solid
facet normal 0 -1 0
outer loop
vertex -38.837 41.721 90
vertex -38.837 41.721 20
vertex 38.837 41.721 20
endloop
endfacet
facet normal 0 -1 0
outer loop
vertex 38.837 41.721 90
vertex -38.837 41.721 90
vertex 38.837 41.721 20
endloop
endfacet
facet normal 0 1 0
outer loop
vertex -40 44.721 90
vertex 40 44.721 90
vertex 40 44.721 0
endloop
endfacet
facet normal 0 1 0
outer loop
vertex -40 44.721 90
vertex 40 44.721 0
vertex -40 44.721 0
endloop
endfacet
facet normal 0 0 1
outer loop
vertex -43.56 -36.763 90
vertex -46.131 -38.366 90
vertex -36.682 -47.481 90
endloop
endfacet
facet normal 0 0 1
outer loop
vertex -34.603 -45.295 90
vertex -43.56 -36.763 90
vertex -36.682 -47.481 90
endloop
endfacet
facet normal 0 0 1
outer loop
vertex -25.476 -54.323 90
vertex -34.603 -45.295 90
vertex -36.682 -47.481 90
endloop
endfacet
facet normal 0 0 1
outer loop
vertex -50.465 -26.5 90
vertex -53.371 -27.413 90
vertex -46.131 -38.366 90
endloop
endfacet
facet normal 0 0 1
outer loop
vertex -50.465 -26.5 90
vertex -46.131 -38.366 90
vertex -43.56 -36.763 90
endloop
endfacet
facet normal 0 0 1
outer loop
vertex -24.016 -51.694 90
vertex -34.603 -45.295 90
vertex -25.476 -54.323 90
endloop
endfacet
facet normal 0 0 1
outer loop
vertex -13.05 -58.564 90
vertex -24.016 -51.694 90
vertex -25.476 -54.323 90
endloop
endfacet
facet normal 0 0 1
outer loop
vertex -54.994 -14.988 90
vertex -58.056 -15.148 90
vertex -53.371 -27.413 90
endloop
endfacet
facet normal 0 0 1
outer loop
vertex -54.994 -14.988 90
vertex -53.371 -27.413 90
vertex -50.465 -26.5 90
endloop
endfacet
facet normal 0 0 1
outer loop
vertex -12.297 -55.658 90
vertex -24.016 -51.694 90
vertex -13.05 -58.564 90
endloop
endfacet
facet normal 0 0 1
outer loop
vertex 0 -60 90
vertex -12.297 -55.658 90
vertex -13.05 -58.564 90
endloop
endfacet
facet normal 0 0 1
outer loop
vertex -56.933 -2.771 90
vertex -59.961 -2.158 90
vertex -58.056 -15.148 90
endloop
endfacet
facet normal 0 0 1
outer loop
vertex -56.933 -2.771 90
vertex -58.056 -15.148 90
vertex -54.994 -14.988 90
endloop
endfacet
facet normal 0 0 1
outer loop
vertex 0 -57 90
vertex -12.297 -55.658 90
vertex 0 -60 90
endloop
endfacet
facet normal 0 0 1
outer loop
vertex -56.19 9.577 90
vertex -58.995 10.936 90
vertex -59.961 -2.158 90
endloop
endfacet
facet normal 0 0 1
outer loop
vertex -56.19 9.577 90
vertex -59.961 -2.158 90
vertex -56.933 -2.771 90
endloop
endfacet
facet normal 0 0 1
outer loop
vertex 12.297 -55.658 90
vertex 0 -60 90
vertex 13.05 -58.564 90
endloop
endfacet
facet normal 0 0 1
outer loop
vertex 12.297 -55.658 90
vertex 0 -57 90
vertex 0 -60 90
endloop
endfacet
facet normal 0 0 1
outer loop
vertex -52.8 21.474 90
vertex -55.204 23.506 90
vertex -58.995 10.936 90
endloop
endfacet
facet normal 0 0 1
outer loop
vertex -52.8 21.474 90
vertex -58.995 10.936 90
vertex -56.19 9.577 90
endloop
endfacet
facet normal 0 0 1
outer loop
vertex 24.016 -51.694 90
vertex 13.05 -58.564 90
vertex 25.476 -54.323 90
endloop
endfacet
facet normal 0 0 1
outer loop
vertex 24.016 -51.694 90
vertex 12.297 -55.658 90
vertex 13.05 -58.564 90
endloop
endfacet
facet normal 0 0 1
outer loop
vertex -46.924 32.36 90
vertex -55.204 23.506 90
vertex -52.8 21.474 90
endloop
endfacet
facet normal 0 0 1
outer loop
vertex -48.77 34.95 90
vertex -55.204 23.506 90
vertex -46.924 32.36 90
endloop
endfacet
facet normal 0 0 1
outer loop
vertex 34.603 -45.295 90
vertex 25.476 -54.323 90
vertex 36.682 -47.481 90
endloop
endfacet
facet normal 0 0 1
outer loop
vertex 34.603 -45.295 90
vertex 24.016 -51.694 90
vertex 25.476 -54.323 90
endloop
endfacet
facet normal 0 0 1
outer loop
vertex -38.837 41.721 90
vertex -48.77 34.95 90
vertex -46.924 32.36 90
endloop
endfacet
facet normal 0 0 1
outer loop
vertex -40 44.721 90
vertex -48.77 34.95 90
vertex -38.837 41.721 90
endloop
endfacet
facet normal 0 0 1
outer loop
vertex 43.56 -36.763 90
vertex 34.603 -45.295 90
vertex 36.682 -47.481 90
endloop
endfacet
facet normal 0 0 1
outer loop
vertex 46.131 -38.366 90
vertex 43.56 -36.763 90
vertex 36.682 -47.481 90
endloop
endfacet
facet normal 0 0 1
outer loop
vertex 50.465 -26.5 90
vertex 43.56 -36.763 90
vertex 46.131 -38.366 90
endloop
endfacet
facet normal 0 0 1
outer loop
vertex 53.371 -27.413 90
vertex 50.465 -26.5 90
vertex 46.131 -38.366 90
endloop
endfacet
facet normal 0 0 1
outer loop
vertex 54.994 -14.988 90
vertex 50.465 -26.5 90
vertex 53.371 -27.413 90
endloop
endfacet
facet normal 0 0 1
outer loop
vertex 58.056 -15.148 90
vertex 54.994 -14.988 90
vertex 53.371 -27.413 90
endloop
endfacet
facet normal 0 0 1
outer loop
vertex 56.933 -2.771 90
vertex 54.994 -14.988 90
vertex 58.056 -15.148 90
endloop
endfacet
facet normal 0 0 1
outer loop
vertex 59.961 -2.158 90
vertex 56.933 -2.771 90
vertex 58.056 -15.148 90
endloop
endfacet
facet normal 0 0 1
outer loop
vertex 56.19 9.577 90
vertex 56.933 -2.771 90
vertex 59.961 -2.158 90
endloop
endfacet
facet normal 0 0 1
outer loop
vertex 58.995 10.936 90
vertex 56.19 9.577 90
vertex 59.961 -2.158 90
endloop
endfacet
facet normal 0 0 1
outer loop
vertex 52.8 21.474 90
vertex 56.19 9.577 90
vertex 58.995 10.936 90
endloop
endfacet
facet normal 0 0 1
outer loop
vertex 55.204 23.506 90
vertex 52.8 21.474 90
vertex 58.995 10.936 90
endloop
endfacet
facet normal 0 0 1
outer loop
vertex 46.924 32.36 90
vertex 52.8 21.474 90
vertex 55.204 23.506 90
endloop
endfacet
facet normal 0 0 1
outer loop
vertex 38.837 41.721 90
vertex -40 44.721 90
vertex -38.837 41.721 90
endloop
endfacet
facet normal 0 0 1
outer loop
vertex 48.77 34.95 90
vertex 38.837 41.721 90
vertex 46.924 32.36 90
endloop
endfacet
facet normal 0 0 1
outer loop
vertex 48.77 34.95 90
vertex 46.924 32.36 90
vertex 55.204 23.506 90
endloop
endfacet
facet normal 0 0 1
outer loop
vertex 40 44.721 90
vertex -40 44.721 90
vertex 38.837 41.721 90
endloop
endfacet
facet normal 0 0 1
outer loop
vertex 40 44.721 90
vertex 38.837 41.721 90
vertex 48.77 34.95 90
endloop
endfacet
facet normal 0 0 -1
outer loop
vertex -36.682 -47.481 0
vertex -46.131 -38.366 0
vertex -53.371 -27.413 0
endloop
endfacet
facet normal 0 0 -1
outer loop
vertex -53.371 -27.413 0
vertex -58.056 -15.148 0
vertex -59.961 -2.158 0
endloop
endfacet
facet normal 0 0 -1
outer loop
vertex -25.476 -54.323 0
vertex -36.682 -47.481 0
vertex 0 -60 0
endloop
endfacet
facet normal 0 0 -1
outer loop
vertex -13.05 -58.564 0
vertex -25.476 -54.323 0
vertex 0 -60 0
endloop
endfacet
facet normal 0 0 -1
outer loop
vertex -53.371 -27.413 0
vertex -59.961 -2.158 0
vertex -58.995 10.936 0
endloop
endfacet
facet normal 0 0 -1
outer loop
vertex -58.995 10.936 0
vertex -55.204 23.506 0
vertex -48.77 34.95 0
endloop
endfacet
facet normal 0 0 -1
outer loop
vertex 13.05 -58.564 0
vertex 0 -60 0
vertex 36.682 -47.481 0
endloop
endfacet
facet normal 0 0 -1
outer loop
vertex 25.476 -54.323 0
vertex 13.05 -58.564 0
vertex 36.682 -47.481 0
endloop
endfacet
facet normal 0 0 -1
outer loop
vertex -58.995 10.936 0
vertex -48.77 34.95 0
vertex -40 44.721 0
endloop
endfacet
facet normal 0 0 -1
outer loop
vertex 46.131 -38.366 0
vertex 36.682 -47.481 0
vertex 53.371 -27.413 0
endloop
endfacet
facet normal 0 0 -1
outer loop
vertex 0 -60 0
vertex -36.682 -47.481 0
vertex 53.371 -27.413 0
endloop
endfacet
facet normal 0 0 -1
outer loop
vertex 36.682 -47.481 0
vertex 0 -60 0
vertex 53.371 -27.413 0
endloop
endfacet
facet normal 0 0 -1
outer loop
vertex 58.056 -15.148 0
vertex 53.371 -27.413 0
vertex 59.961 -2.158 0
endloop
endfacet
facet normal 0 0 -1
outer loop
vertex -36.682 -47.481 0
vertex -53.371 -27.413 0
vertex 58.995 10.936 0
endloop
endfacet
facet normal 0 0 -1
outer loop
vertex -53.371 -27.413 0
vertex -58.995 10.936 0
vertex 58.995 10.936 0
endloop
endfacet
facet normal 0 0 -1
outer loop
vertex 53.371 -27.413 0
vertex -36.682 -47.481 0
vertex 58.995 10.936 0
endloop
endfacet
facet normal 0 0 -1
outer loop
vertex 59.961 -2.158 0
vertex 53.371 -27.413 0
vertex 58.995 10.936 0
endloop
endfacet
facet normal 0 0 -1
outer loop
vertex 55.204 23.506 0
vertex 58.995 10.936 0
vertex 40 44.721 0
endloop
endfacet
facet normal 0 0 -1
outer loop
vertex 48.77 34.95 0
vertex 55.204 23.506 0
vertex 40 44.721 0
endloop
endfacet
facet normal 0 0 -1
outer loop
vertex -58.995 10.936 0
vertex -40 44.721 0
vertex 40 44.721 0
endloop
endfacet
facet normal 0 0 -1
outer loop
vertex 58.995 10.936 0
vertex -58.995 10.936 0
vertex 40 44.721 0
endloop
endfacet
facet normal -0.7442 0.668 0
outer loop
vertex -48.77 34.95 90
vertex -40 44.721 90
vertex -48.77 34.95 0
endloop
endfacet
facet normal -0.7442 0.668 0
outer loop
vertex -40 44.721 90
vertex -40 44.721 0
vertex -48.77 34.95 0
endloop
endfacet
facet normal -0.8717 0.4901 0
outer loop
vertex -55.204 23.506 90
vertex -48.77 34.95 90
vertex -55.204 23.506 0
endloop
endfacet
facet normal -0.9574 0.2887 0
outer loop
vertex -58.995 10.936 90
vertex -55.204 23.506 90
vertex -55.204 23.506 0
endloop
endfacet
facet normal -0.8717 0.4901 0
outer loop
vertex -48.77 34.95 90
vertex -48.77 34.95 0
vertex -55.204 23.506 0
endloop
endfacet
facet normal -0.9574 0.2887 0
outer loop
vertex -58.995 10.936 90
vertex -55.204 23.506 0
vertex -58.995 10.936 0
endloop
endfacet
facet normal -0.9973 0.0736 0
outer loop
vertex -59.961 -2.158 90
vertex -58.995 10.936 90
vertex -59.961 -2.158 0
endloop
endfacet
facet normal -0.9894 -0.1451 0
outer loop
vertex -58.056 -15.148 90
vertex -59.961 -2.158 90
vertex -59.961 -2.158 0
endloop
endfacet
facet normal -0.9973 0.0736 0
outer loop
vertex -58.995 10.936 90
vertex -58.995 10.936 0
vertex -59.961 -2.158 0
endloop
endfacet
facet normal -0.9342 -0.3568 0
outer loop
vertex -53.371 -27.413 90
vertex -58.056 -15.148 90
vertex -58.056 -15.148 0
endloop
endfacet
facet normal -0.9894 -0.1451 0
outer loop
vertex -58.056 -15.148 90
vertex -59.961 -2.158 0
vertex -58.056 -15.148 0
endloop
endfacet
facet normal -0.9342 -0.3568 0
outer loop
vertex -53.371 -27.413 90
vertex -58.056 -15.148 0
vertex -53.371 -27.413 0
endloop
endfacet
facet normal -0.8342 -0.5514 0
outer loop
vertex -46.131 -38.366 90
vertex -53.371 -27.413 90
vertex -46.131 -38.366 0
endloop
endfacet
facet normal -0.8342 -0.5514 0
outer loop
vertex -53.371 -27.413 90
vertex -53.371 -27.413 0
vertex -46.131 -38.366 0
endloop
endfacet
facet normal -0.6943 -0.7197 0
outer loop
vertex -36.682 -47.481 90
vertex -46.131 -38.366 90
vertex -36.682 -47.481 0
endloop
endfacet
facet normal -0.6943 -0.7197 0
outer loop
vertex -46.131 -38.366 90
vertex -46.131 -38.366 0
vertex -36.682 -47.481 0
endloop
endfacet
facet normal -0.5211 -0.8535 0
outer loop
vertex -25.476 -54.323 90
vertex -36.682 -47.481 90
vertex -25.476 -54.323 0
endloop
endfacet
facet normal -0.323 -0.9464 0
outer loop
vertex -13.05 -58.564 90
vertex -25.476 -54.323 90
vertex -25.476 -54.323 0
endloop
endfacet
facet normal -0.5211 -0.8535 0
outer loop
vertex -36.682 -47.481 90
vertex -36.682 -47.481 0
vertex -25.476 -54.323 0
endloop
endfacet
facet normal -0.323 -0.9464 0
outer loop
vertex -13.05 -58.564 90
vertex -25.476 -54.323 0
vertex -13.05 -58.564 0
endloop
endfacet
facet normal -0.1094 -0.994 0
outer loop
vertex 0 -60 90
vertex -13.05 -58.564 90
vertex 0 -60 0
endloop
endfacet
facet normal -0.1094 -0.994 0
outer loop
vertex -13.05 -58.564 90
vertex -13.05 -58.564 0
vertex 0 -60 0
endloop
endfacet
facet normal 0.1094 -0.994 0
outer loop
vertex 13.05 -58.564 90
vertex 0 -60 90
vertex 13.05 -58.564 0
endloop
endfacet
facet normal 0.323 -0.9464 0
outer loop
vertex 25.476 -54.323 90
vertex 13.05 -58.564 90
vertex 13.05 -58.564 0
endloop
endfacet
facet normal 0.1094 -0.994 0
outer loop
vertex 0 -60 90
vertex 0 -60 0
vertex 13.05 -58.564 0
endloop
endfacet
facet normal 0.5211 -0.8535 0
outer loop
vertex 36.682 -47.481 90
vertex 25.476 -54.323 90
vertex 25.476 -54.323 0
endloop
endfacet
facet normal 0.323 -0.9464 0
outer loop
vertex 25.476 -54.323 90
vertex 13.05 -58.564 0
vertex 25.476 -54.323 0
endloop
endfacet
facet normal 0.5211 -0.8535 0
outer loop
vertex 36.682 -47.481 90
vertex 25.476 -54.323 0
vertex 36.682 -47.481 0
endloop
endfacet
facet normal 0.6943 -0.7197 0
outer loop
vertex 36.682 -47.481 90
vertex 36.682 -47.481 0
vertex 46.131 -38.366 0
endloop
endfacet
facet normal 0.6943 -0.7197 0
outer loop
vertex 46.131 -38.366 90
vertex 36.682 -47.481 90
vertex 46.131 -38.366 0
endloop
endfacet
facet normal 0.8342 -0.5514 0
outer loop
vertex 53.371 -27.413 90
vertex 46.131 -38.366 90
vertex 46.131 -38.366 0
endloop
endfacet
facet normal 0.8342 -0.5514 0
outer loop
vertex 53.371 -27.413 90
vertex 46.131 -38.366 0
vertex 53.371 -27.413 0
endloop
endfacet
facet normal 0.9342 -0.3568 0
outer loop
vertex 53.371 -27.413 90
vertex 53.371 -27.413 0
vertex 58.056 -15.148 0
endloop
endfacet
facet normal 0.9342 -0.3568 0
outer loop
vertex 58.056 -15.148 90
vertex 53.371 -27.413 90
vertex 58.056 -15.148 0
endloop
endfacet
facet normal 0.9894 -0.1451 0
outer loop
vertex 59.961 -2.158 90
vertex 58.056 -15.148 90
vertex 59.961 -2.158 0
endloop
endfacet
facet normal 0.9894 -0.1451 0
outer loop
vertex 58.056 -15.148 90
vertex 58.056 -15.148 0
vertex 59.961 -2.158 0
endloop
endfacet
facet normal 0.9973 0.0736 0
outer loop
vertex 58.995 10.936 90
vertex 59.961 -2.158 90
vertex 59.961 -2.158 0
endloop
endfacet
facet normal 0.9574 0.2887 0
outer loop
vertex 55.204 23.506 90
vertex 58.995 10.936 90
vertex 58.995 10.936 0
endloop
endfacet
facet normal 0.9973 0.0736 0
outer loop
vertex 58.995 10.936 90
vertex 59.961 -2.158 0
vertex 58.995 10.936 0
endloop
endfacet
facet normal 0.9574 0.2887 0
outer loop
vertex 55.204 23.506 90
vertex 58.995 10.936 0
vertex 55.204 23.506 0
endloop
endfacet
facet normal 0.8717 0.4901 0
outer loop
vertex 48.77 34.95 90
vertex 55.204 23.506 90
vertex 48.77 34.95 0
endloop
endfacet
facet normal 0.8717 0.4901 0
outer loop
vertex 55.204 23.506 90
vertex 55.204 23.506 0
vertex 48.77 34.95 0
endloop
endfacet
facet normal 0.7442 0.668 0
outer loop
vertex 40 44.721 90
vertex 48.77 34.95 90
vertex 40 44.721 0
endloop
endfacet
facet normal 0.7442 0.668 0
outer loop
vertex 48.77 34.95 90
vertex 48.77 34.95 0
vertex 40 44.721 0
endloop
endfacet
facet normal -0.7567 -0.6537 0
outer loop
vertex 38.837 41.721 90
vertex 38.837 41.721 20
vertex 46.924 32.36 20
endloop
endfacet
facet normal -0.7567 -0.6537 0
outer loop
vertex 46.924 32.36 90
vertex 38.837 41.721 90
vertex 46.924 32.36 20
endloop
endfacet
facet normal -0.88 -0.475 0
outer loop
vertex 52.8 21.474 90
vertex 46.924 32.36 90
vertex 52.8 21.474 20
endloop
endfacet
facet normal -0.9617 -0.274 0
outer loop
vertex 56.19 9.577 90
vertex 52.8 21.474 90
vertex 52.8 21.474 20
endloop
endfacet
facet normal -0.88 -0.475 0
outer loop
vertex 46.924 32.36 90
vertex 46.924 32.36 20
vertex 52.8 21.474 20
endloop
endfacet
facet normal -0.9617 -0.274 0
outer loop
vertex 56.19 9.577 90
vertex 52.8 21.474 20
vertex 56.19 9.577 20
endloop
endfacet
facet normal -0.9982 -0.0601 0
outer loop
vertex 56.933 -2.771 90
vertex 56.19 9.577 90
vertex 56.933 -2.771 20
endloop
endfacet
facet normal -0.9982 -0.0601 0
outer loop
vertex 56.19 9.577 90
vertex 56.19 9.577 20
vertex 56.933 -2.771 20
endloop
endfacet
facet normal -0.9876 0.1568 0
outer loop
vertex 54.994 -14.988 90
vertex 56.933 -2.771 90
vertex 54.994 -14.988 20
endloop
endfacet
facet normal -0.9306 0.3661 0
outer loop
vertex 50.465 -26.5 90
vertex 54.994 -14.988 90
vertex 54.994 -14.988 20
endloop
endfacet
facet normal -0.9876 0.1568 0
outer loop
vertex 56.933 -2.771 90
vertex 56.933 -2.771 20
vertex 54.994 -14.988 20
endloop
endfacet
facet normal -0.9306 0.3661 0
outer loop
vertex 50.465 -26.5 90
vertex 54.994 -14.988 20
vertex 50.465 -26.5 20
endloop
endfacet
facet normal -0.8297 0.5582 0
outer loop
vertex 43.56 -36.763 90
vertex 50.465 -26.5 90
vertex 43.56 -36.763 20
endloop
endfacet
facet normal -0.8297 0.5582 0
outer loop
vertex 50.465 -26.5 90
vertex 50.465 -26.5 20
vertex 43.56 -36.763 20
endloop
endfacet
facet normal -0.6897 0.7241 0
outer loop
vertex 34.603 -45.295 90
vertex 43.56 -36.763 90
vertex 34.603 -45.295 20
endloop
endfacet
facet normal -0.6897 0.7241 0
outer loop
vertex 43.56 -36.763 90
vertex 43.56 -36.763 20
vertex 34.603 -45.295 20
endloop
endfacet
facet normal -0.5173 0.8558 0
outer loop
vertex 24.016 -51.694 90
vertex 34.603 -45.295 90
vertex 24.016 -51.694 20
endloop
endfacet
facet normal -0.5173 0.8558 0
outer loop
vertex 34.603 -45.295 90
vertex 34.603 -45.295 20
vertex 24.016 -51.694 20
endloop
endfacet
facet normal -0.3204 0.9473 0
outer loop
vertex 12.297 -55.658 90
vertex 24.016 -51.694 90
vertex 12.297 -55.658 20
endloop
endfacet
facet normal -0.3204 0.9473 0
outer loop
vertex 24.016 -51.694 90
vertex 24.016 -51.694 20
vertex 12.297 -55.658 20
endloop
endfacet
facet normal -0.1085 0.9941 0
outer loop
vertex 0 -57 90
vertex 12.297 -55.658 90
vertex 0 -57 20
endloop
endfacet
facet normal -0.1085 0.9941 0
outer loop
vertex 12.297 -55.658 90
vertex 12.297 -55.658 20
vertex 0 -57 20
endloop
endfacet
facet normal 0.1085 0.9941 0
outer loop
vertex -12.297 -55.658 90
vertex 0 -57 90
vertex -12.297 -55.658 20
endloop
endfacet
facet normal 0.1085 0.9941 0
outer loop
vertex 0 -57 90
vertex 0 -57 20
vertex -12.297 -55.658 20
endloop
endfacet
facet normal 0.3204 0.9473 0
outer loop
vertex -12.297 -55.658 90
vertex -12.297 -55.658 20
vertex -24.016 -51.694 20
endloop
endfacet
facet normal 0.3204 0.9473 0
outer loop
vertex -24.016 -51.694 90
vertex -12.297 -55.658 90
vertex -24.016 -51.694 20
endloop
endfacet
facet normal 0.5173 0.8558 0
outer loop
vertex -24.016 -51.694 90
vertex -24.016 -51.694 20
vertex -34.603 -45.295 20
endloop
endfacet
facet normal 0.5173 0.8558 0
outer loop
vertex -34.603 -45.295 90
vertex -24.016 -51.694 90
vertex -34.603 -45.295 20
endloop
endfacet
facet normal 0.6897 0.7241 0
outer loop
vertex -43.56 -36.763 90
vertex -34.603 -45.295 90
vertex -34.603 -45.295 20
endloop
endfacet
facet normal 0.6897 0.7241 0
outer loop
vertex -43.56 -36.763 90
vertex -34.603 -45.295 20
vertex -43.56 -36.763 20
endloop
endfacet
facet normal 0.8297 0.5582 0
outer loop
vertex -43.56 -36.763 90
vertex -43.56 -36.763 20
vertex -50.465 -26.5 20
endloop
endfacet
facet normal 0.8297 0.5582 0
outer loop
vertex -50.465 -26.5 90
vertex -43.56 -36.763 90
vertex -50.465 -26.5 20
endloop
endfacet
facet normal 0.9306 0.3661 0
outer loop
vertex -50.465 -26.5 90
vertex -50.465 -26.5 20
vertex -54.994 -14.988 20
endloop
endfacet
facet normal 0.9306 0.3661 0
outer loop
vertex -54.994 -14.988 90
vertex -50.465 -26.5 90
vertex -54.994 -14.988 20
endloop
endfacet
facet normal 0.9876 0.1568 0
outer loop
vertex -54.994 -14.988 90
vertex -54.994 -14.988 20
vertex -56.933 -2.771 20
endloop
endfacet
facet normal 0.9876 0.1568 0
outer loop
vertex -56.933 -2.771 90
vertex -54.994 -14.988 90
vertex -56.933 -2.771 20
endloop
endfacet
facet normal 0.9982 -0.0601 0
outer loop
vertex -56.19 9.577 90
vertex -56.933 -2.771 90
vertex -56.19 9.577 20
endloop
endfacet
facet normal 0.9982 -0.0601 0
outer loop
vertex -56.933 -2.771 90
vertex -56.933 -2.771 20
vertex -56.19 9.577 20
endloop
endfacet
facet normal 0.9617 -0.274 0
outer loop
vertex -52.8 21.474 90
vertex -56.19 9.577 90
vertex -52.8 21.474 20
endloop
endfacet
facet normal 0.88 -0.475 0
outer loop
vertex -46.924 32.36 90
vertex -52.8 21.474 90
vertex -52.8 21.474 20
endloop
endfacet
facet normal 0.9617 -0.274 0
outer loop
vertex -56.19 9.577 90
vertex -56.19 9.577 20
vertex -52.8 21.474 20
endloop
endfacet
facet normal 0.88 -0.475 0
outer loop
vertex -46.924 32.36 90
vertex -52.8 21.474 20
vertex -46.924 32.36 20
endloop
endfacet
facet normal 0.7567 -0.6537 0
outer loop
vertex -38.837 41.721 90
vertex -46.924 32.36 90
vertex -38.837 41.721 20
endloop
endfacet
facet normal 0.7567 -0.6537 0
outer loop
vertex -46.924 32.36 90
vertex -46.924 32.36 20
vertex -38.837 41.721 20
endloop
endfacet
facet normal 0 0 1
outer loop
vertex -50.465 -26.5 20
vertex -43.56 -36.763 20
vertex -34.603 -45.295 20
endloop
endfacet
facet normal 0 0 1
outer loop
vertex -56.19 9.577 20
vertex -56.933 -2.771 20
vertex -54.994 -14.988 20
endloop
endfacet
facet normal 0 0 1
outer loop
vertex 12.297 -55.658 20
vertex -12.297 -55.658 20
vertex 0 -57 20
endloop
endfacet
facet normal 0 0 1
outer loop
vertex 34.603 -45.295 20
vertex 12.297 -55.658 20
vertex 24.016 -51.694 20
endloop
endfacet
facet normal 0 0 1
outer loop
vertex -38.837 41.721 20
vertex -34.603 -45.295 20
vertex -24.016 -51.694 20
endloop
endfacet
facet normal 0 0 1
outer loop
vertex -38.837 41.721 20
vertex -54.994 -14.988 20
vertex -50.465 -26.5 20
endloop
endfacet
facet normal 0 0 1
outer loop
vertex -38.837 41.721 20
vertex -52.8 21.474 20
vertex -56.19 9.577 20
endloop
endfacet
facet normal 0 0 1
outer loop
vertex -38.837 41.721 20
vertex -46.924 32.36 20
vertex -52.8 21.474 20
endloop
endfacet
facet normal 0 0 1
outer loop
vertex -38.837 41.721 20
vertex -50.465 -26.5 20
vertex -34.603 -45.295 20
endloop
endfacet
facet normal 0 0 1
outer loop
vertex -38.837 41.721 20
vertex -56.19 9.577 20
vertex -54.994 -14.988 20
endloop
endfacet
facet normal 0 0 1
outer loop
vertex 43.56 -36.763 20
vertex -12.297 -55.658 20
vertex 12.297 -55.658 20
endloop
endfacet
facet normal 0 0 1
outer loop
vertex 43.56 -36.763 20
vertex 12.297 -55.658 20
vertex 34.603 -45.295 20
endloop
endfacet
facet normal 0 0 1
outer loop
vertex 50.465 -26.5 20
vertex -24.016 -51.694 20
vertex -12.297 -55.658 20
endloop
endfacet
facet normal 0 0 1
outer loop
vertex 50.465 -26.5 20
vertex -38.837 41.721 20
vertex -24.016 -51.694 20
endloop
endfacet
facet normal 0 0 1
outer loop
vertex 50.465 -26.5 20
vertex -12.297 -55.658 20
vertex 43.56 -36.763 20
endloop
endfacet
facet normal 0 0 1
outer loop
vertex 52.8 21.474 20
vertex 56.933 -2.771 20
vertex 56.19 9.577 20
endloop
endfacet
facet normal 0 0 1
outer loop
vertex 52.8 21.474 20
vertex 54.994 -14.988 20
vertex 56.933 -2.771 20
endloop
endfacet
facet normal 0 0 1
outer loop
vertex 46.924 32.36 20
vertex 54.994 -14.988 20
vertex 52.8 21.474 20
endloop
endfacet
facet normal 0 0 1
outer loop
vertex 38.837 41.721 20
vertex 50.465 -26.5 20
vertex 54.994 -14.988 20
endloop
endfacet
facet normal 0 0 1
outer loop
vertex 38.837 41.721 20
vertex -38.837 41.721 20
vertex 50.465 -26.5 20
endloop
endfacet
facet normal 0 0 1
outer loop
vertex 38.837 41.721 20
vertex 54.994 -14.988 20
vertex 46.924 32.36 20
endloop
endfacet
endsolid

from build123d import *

# Parameters (mm, degrees)
F1_DEPTH = 20
F3_DEPTH = 70


with BuildPart() as f1:
    # F0 (on Top) → F1 (new body)
    with BuildSketch(Plane.XY):
        with BuildLine():
            Line((40, 44.72136), (-40, 44.72136))
            ThreePointArc((-40, 44.72136), (0, -60), (40, 44.72136))
        make_face()
    extrude(amount=F1_DEPTH)

    # F2 (on face) → F3 (join)
    with BuildSketch(Plane.XY.offset(20)):
        with BuildLine():
            Line((40, 44.72136), (-40, 44.72136))
            ThreePointArc((-40, 44.72136), (0, -60), (40, 44.72136))
        make_face()
        with BuildLine():
            ThreePointArc((38.837201, 41.72136), (0, -57), (-38.837201, 41.72136))
            Line((-38.837201, 41.72136), (38.837201, 41.72136))
        make_face(mode=Mode.SUBTRACT)
    extrude(amount=F3_DEPTH)


solid = f1.part
